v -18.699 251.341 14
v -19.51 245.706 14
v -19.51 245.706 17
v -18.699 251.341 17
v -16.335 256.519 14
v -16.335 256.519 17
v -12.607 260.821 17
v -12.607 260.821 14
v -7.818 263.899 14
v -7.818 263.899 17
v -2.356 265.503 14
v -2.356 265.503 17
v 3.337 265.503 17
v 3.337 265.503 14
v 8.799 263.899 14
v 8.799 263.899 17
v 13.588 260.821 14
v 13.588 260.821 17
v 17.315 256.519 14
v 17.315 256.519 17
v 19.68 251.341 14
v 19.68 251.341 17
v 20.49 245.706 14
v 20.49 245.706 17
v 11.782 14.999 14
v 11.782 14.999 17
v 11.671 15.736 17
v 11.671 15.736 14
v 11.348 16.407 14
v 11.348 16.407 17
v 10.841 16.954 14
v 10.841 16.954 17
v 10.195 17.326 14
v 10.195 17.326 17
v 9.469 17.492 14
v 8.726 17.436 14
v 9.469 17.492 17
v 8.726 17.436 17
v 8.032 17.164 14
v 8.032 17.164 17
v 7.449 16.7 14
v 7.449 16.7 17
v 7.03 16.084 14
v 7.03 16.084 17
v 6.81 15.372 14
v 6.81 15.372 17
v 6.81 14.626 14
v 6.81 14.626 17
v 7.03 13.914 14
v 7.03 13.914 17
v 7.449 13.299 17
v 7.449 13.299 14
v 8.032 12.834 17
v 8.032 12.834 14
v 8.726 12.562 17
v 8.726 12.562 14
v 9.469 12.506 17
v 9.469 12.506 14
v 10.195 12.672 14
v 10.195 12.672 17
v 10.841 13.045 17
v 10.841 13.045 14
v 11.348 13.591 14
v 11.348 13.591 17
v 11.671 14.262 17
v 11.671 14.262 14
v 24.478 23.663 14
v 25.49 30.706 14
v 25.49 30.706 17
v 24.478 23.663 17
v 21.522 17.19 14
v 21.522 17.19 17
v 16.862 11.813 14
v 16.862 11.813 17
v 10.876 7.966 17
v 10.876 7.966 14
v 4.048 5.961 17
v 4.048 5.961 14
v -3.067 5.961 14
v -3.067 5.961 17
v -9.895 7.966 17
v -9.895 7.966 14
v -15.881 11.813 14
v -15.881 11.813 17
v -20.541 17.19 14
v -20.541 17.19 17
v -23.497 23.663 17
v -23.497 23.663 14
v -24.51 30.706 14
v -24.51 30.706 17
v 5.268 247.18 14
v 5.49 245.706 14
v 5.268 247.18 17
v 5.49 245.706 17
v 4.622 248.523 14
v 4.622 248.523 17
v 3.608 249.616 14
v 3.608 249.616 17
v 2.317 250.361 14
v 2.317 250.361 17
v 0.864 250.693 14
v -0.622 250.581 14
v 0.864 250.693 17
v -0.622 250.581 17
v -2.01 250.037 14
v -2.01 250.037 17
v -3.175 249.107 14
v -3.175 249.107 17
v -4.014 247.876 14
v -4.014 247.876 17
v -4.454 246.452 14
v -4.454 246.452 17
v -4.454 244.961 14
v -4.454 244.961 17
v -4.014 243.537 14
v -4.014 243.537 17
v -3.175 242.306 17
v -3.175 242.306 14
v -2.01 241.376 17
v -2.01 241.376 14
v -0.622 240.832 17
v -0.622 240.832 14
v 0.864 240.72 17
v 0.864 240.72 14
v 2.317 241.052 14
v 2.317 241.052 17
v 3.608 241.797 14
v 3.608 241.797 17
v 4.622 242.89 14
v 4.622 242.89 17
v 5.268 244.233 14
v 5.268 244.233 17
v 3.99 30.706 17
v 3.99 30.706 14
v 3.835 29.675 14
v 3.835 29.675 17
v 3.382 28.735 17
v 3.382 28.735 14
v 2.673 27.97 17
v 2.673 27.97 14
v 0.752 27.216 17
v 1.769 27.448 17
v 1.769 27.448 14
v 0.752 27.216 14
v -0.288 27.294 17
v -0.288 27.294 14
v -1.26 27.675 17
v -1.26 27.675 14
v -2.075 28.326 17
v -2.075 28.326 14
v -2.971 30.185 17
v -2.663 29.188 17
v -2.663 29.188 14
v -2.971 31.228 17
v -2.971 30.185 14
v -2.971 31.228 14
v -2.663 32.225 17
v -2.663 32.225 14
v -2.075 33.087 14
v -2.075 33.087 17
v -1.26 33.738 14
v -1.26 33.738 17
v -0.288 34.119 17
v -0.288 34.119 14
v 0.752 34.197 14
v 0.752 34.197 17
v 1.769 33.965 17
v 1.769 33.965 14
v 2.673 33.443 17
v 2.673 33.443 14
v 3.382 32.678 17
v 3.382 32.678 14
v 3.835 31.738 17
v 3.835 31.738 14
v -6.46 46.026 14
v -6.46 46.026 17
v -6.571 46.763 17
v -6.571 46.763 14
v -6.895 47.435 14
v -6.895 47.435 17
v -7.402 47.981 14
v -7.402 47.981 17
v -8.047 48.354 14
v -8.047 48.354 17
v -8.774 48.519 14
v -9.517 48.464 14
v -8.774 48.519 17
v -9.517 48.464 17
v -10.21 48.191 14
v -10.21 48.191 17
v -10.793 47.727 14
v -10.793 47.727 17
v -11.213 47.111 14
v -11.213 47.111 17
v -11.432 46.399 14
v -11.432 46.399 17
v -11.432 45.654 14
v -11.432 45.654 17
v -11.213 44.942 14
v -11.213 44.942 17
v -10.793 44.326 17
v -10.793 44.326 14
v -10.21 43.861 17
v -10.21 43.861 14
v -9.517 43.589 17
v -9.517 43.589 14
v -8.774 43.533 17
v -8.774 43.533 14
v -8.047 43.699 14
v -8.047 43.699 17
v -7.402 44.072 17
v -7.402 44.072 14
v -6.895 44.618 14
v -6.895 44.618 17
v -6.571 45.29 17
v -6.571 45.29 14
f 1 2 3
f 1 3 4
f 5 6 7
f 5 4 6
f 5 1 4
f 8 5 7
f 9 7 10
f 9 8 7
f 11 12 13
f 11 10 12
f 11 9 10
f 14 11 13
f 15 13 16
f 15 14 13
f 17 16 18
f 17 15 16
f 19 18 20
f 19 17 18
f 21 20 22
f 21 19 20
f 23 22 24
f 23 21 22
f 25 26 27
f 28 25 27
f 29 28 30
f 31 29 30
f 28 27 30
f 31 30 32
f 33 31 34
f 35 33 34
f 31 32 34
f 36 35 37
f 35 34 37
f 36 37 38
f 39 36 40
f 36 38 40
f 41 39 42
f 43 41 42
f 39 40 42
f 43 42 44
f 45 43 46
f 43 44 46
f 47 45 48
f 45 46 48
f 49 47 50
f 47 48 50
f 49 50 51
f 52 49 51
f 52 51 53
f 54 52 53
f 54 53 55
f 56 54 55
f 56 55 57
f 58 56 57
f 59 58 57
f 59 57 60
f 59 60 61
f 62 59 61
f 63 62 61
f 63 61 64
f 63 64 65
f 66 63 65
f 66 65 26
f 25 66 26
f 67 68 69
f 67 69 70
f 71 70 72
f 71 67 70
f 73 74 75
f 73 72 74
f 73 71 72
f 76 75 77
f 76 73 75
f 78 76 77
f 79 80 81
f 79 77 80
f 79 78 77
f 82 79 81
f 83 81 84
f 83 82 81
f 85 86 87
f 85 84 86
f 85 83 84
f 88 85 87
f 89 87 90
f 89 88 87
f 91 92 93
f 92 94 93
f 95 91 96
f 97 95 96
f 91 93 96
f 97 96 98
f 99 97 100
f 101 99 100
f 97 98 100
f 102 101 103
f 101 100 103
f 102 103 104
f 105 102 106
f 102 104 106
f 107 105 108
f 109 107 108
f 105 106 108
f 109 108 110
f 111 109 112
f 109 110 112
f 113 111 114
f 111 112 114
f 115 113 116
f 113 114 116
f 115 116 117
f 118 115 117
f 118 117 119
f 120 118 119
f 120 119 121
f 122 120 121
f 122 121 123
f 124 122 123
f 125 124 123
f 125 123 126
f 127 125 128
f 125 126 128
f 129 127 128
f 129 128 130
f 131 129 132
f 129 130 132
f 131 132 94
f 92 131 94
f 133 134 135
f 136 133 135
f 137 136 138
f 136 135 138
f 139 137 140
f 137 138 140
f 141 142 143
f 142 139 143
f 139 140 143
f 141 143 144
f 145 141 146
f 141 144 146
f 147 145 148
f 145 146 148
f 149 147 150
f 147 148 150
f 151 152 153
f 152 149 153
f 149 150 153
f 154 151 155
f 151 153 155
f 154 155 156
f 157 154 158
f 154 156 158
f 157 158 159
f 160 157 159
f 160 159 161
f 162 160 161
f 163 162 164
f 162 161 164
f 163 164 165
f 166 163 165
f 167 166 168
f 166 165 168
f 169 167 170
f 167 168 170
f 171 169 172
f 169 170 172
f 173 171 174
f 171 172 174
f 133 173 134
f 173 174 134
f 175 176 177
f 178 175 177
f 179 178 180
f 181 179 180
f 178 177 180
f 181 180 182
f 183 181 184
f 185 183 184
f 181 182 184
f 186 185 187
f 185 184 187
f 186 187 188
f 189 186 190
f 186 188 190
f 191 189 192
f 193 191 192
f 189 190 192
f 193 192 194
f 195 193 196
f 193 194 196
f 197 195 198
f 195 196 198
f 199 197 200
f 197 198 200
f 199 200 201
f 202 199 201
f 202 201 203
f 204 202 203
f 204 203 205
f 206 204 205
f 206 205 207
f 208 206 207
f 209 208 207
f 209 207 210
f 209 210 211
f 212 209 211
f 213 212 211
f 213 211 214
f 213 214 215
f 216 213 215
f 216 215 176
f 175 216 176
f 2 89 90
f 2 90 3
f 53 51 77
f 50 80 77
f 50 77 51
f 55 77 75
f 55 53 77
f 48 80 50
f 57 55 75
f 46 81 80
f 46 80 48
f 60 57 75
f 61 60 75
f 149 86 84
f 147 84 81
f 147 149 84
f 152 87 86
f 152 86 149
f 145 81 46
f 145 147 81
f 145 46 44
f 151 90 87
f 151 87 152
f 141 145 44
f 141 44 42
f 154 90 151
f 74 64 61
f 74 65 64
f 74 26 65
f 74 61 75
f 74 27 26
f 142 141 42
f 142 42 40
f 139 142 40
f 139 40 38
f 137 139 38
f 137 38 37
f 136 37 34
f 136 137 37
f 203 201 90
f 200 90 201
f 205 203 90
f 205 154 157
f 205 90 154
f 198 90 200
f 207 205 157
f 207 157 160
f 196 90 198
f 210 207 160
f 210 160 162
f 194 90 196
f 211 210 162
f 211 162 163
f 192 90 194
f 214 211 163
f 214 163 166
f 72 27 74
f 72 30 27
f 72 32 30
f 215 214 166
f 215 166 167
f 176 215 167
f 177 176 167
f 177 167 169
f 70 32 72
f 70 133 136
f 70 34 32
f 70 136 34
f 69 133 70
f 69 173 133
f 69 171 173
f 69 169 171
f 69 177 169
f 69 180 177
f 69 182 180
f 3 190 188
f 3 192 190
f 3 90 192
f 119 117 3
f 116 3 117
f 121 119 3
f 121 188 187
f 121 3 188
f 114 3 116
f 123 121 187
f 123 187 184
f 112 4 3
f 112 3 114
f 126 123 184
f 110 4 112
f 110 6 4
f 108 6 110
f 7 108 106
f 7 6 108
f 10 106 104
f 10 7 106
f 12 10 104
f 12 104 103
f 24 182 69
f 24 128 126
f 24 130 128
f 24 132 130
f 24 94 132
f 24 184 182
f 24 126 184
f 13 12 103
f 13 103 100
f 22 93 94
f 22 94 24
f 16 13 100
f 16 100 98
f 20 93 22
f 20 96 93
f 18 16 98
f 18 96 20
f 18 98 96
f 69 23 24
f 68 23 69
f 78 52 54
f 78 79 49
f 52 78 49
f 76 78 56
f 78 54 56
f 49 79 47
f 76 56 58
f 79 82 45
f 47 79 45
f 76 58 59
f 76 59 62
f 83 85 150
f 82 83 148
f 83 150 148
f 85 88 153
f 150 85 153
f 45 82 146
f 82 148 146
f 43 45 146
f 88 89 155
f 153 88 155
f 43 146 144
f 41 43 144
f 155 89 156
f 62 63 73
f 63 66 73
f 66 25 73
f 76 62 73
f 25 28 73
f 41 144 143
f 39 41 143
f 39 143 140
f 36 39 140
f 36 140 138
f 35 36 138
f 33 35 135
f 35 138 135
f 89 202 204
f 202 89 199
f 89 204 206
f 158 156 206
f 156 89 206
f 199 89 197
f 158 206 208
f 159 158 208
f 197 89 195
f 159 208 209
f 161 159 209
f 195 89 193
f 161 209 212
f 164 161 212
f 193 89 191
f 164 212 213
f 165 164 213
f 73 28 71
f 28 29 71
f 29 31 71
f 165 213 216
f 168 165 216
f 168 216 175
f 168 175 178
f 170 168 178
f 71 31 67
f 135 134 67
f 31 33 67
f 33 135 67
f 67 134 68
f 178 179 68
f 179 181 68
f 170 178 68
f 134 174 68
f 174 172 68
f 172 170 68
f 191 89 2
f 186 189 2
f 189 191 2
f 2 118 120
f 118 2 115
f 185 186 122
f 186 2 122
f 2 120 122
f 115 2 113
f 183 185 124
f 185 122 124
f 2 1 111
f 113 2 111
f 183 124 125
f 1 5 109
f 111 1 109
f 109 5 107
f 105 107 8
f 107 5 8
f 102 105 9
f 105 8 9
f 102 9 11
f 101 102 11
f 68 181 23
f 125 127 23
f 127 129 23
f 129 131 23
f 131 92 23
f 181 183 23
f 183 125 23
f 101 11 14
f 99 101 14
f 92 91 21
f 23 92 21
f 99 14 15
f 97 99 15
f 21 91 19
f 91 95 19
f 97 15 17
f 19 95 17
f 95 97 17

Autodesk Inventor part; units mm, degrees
ref_plane "YZ Plane" through (0, 0, 0) normal (1, 0, 0) x (0, 1, 0)
ref_plane "XZ Plane" through (0, 0, 0) normal (0, 1, 0) x (-1, 0, 0)
ref_plane "XY Plane" through (0, 0, 0) normal (0, 0, 1) x (1, 0, 0)
ref_plane "Work Plane2" through (0.4904, 0, 14) normal (0, 0, 1) x (1, 0, 0)
sketch "Sketch1" plane through (0.4904, 0, 14) normal (0, 0, 1) x (1, 0, 0)
  line L0 (-25, 245.7065) -> (25, 245.7065)
  line L1 (25, 245.7065) -> (25, 5.7065)
  line L2 (25, 5.7065) -> (-25, 5.7065)
  line L3 (-25, 5.7065) -> (-25, 245.7065)
  line L4 (-20, 245.7065) -> (20, 245.7065)
  line L5 (20, 5.7065) -> (-20, 5.7065)
  circle A0 centre (0, 30.7065) radius 3.5 projected
  circle A1 centre (0, 30.7065) radius 25
  circle A2 centre (0, 245.7065) radius 20
  line L6 (-25, 30.7065) -> (-20, 245.7065)
  line L7 (20, 245.7065) -> (25, 30.7065)
  point P0 (-0.4904, 0)
  point P1 (-20, 245.7065)
  dimension "d6" = 240
  dimension "d7" = 0
  dimension "d9" = 50
  dimension "d10" = 25
  dimension "d11" = 25
  dimension "d12" = 25
  dimension "d13" = 0
extrude "Extrusion1" add sketch "Sketch1" along normal blind 3 contours A2 L0 | L0 A2 | A2 L7 A1 L6 | L6 A1 L7
sketch "Sketch2" plane through (0.4904, 0, 17) normal (0, 0, 1) x (1, 0, 0)
  arc A0 (20, 245.7065) -> (-20, 245.7065) centre (0, 245.7065) ccw projected
  circle A1 centre (0, 245.7065) radius 5
  point P0 (-0.4904, 0)
  dimension "d16" = 10
extrude "Extrusion2" cut sketch "Sketch2" against normal blind 3
sketch "Sketch3" plane through (0.4904, 0, 17) normal (0, 0, 1) x (1, 0, 0)
  circle A0 centre (-9.4508, 46.0264) radius 2.5 projected
  circle A1 centre (8.7917, 14.9991) radius 2.5 projected
  point P0 (-0.4904, 0)
extrude "Extrusion3" cut sketch "Sketch3" against normal blind 10
properties part number "Link2Base2"
